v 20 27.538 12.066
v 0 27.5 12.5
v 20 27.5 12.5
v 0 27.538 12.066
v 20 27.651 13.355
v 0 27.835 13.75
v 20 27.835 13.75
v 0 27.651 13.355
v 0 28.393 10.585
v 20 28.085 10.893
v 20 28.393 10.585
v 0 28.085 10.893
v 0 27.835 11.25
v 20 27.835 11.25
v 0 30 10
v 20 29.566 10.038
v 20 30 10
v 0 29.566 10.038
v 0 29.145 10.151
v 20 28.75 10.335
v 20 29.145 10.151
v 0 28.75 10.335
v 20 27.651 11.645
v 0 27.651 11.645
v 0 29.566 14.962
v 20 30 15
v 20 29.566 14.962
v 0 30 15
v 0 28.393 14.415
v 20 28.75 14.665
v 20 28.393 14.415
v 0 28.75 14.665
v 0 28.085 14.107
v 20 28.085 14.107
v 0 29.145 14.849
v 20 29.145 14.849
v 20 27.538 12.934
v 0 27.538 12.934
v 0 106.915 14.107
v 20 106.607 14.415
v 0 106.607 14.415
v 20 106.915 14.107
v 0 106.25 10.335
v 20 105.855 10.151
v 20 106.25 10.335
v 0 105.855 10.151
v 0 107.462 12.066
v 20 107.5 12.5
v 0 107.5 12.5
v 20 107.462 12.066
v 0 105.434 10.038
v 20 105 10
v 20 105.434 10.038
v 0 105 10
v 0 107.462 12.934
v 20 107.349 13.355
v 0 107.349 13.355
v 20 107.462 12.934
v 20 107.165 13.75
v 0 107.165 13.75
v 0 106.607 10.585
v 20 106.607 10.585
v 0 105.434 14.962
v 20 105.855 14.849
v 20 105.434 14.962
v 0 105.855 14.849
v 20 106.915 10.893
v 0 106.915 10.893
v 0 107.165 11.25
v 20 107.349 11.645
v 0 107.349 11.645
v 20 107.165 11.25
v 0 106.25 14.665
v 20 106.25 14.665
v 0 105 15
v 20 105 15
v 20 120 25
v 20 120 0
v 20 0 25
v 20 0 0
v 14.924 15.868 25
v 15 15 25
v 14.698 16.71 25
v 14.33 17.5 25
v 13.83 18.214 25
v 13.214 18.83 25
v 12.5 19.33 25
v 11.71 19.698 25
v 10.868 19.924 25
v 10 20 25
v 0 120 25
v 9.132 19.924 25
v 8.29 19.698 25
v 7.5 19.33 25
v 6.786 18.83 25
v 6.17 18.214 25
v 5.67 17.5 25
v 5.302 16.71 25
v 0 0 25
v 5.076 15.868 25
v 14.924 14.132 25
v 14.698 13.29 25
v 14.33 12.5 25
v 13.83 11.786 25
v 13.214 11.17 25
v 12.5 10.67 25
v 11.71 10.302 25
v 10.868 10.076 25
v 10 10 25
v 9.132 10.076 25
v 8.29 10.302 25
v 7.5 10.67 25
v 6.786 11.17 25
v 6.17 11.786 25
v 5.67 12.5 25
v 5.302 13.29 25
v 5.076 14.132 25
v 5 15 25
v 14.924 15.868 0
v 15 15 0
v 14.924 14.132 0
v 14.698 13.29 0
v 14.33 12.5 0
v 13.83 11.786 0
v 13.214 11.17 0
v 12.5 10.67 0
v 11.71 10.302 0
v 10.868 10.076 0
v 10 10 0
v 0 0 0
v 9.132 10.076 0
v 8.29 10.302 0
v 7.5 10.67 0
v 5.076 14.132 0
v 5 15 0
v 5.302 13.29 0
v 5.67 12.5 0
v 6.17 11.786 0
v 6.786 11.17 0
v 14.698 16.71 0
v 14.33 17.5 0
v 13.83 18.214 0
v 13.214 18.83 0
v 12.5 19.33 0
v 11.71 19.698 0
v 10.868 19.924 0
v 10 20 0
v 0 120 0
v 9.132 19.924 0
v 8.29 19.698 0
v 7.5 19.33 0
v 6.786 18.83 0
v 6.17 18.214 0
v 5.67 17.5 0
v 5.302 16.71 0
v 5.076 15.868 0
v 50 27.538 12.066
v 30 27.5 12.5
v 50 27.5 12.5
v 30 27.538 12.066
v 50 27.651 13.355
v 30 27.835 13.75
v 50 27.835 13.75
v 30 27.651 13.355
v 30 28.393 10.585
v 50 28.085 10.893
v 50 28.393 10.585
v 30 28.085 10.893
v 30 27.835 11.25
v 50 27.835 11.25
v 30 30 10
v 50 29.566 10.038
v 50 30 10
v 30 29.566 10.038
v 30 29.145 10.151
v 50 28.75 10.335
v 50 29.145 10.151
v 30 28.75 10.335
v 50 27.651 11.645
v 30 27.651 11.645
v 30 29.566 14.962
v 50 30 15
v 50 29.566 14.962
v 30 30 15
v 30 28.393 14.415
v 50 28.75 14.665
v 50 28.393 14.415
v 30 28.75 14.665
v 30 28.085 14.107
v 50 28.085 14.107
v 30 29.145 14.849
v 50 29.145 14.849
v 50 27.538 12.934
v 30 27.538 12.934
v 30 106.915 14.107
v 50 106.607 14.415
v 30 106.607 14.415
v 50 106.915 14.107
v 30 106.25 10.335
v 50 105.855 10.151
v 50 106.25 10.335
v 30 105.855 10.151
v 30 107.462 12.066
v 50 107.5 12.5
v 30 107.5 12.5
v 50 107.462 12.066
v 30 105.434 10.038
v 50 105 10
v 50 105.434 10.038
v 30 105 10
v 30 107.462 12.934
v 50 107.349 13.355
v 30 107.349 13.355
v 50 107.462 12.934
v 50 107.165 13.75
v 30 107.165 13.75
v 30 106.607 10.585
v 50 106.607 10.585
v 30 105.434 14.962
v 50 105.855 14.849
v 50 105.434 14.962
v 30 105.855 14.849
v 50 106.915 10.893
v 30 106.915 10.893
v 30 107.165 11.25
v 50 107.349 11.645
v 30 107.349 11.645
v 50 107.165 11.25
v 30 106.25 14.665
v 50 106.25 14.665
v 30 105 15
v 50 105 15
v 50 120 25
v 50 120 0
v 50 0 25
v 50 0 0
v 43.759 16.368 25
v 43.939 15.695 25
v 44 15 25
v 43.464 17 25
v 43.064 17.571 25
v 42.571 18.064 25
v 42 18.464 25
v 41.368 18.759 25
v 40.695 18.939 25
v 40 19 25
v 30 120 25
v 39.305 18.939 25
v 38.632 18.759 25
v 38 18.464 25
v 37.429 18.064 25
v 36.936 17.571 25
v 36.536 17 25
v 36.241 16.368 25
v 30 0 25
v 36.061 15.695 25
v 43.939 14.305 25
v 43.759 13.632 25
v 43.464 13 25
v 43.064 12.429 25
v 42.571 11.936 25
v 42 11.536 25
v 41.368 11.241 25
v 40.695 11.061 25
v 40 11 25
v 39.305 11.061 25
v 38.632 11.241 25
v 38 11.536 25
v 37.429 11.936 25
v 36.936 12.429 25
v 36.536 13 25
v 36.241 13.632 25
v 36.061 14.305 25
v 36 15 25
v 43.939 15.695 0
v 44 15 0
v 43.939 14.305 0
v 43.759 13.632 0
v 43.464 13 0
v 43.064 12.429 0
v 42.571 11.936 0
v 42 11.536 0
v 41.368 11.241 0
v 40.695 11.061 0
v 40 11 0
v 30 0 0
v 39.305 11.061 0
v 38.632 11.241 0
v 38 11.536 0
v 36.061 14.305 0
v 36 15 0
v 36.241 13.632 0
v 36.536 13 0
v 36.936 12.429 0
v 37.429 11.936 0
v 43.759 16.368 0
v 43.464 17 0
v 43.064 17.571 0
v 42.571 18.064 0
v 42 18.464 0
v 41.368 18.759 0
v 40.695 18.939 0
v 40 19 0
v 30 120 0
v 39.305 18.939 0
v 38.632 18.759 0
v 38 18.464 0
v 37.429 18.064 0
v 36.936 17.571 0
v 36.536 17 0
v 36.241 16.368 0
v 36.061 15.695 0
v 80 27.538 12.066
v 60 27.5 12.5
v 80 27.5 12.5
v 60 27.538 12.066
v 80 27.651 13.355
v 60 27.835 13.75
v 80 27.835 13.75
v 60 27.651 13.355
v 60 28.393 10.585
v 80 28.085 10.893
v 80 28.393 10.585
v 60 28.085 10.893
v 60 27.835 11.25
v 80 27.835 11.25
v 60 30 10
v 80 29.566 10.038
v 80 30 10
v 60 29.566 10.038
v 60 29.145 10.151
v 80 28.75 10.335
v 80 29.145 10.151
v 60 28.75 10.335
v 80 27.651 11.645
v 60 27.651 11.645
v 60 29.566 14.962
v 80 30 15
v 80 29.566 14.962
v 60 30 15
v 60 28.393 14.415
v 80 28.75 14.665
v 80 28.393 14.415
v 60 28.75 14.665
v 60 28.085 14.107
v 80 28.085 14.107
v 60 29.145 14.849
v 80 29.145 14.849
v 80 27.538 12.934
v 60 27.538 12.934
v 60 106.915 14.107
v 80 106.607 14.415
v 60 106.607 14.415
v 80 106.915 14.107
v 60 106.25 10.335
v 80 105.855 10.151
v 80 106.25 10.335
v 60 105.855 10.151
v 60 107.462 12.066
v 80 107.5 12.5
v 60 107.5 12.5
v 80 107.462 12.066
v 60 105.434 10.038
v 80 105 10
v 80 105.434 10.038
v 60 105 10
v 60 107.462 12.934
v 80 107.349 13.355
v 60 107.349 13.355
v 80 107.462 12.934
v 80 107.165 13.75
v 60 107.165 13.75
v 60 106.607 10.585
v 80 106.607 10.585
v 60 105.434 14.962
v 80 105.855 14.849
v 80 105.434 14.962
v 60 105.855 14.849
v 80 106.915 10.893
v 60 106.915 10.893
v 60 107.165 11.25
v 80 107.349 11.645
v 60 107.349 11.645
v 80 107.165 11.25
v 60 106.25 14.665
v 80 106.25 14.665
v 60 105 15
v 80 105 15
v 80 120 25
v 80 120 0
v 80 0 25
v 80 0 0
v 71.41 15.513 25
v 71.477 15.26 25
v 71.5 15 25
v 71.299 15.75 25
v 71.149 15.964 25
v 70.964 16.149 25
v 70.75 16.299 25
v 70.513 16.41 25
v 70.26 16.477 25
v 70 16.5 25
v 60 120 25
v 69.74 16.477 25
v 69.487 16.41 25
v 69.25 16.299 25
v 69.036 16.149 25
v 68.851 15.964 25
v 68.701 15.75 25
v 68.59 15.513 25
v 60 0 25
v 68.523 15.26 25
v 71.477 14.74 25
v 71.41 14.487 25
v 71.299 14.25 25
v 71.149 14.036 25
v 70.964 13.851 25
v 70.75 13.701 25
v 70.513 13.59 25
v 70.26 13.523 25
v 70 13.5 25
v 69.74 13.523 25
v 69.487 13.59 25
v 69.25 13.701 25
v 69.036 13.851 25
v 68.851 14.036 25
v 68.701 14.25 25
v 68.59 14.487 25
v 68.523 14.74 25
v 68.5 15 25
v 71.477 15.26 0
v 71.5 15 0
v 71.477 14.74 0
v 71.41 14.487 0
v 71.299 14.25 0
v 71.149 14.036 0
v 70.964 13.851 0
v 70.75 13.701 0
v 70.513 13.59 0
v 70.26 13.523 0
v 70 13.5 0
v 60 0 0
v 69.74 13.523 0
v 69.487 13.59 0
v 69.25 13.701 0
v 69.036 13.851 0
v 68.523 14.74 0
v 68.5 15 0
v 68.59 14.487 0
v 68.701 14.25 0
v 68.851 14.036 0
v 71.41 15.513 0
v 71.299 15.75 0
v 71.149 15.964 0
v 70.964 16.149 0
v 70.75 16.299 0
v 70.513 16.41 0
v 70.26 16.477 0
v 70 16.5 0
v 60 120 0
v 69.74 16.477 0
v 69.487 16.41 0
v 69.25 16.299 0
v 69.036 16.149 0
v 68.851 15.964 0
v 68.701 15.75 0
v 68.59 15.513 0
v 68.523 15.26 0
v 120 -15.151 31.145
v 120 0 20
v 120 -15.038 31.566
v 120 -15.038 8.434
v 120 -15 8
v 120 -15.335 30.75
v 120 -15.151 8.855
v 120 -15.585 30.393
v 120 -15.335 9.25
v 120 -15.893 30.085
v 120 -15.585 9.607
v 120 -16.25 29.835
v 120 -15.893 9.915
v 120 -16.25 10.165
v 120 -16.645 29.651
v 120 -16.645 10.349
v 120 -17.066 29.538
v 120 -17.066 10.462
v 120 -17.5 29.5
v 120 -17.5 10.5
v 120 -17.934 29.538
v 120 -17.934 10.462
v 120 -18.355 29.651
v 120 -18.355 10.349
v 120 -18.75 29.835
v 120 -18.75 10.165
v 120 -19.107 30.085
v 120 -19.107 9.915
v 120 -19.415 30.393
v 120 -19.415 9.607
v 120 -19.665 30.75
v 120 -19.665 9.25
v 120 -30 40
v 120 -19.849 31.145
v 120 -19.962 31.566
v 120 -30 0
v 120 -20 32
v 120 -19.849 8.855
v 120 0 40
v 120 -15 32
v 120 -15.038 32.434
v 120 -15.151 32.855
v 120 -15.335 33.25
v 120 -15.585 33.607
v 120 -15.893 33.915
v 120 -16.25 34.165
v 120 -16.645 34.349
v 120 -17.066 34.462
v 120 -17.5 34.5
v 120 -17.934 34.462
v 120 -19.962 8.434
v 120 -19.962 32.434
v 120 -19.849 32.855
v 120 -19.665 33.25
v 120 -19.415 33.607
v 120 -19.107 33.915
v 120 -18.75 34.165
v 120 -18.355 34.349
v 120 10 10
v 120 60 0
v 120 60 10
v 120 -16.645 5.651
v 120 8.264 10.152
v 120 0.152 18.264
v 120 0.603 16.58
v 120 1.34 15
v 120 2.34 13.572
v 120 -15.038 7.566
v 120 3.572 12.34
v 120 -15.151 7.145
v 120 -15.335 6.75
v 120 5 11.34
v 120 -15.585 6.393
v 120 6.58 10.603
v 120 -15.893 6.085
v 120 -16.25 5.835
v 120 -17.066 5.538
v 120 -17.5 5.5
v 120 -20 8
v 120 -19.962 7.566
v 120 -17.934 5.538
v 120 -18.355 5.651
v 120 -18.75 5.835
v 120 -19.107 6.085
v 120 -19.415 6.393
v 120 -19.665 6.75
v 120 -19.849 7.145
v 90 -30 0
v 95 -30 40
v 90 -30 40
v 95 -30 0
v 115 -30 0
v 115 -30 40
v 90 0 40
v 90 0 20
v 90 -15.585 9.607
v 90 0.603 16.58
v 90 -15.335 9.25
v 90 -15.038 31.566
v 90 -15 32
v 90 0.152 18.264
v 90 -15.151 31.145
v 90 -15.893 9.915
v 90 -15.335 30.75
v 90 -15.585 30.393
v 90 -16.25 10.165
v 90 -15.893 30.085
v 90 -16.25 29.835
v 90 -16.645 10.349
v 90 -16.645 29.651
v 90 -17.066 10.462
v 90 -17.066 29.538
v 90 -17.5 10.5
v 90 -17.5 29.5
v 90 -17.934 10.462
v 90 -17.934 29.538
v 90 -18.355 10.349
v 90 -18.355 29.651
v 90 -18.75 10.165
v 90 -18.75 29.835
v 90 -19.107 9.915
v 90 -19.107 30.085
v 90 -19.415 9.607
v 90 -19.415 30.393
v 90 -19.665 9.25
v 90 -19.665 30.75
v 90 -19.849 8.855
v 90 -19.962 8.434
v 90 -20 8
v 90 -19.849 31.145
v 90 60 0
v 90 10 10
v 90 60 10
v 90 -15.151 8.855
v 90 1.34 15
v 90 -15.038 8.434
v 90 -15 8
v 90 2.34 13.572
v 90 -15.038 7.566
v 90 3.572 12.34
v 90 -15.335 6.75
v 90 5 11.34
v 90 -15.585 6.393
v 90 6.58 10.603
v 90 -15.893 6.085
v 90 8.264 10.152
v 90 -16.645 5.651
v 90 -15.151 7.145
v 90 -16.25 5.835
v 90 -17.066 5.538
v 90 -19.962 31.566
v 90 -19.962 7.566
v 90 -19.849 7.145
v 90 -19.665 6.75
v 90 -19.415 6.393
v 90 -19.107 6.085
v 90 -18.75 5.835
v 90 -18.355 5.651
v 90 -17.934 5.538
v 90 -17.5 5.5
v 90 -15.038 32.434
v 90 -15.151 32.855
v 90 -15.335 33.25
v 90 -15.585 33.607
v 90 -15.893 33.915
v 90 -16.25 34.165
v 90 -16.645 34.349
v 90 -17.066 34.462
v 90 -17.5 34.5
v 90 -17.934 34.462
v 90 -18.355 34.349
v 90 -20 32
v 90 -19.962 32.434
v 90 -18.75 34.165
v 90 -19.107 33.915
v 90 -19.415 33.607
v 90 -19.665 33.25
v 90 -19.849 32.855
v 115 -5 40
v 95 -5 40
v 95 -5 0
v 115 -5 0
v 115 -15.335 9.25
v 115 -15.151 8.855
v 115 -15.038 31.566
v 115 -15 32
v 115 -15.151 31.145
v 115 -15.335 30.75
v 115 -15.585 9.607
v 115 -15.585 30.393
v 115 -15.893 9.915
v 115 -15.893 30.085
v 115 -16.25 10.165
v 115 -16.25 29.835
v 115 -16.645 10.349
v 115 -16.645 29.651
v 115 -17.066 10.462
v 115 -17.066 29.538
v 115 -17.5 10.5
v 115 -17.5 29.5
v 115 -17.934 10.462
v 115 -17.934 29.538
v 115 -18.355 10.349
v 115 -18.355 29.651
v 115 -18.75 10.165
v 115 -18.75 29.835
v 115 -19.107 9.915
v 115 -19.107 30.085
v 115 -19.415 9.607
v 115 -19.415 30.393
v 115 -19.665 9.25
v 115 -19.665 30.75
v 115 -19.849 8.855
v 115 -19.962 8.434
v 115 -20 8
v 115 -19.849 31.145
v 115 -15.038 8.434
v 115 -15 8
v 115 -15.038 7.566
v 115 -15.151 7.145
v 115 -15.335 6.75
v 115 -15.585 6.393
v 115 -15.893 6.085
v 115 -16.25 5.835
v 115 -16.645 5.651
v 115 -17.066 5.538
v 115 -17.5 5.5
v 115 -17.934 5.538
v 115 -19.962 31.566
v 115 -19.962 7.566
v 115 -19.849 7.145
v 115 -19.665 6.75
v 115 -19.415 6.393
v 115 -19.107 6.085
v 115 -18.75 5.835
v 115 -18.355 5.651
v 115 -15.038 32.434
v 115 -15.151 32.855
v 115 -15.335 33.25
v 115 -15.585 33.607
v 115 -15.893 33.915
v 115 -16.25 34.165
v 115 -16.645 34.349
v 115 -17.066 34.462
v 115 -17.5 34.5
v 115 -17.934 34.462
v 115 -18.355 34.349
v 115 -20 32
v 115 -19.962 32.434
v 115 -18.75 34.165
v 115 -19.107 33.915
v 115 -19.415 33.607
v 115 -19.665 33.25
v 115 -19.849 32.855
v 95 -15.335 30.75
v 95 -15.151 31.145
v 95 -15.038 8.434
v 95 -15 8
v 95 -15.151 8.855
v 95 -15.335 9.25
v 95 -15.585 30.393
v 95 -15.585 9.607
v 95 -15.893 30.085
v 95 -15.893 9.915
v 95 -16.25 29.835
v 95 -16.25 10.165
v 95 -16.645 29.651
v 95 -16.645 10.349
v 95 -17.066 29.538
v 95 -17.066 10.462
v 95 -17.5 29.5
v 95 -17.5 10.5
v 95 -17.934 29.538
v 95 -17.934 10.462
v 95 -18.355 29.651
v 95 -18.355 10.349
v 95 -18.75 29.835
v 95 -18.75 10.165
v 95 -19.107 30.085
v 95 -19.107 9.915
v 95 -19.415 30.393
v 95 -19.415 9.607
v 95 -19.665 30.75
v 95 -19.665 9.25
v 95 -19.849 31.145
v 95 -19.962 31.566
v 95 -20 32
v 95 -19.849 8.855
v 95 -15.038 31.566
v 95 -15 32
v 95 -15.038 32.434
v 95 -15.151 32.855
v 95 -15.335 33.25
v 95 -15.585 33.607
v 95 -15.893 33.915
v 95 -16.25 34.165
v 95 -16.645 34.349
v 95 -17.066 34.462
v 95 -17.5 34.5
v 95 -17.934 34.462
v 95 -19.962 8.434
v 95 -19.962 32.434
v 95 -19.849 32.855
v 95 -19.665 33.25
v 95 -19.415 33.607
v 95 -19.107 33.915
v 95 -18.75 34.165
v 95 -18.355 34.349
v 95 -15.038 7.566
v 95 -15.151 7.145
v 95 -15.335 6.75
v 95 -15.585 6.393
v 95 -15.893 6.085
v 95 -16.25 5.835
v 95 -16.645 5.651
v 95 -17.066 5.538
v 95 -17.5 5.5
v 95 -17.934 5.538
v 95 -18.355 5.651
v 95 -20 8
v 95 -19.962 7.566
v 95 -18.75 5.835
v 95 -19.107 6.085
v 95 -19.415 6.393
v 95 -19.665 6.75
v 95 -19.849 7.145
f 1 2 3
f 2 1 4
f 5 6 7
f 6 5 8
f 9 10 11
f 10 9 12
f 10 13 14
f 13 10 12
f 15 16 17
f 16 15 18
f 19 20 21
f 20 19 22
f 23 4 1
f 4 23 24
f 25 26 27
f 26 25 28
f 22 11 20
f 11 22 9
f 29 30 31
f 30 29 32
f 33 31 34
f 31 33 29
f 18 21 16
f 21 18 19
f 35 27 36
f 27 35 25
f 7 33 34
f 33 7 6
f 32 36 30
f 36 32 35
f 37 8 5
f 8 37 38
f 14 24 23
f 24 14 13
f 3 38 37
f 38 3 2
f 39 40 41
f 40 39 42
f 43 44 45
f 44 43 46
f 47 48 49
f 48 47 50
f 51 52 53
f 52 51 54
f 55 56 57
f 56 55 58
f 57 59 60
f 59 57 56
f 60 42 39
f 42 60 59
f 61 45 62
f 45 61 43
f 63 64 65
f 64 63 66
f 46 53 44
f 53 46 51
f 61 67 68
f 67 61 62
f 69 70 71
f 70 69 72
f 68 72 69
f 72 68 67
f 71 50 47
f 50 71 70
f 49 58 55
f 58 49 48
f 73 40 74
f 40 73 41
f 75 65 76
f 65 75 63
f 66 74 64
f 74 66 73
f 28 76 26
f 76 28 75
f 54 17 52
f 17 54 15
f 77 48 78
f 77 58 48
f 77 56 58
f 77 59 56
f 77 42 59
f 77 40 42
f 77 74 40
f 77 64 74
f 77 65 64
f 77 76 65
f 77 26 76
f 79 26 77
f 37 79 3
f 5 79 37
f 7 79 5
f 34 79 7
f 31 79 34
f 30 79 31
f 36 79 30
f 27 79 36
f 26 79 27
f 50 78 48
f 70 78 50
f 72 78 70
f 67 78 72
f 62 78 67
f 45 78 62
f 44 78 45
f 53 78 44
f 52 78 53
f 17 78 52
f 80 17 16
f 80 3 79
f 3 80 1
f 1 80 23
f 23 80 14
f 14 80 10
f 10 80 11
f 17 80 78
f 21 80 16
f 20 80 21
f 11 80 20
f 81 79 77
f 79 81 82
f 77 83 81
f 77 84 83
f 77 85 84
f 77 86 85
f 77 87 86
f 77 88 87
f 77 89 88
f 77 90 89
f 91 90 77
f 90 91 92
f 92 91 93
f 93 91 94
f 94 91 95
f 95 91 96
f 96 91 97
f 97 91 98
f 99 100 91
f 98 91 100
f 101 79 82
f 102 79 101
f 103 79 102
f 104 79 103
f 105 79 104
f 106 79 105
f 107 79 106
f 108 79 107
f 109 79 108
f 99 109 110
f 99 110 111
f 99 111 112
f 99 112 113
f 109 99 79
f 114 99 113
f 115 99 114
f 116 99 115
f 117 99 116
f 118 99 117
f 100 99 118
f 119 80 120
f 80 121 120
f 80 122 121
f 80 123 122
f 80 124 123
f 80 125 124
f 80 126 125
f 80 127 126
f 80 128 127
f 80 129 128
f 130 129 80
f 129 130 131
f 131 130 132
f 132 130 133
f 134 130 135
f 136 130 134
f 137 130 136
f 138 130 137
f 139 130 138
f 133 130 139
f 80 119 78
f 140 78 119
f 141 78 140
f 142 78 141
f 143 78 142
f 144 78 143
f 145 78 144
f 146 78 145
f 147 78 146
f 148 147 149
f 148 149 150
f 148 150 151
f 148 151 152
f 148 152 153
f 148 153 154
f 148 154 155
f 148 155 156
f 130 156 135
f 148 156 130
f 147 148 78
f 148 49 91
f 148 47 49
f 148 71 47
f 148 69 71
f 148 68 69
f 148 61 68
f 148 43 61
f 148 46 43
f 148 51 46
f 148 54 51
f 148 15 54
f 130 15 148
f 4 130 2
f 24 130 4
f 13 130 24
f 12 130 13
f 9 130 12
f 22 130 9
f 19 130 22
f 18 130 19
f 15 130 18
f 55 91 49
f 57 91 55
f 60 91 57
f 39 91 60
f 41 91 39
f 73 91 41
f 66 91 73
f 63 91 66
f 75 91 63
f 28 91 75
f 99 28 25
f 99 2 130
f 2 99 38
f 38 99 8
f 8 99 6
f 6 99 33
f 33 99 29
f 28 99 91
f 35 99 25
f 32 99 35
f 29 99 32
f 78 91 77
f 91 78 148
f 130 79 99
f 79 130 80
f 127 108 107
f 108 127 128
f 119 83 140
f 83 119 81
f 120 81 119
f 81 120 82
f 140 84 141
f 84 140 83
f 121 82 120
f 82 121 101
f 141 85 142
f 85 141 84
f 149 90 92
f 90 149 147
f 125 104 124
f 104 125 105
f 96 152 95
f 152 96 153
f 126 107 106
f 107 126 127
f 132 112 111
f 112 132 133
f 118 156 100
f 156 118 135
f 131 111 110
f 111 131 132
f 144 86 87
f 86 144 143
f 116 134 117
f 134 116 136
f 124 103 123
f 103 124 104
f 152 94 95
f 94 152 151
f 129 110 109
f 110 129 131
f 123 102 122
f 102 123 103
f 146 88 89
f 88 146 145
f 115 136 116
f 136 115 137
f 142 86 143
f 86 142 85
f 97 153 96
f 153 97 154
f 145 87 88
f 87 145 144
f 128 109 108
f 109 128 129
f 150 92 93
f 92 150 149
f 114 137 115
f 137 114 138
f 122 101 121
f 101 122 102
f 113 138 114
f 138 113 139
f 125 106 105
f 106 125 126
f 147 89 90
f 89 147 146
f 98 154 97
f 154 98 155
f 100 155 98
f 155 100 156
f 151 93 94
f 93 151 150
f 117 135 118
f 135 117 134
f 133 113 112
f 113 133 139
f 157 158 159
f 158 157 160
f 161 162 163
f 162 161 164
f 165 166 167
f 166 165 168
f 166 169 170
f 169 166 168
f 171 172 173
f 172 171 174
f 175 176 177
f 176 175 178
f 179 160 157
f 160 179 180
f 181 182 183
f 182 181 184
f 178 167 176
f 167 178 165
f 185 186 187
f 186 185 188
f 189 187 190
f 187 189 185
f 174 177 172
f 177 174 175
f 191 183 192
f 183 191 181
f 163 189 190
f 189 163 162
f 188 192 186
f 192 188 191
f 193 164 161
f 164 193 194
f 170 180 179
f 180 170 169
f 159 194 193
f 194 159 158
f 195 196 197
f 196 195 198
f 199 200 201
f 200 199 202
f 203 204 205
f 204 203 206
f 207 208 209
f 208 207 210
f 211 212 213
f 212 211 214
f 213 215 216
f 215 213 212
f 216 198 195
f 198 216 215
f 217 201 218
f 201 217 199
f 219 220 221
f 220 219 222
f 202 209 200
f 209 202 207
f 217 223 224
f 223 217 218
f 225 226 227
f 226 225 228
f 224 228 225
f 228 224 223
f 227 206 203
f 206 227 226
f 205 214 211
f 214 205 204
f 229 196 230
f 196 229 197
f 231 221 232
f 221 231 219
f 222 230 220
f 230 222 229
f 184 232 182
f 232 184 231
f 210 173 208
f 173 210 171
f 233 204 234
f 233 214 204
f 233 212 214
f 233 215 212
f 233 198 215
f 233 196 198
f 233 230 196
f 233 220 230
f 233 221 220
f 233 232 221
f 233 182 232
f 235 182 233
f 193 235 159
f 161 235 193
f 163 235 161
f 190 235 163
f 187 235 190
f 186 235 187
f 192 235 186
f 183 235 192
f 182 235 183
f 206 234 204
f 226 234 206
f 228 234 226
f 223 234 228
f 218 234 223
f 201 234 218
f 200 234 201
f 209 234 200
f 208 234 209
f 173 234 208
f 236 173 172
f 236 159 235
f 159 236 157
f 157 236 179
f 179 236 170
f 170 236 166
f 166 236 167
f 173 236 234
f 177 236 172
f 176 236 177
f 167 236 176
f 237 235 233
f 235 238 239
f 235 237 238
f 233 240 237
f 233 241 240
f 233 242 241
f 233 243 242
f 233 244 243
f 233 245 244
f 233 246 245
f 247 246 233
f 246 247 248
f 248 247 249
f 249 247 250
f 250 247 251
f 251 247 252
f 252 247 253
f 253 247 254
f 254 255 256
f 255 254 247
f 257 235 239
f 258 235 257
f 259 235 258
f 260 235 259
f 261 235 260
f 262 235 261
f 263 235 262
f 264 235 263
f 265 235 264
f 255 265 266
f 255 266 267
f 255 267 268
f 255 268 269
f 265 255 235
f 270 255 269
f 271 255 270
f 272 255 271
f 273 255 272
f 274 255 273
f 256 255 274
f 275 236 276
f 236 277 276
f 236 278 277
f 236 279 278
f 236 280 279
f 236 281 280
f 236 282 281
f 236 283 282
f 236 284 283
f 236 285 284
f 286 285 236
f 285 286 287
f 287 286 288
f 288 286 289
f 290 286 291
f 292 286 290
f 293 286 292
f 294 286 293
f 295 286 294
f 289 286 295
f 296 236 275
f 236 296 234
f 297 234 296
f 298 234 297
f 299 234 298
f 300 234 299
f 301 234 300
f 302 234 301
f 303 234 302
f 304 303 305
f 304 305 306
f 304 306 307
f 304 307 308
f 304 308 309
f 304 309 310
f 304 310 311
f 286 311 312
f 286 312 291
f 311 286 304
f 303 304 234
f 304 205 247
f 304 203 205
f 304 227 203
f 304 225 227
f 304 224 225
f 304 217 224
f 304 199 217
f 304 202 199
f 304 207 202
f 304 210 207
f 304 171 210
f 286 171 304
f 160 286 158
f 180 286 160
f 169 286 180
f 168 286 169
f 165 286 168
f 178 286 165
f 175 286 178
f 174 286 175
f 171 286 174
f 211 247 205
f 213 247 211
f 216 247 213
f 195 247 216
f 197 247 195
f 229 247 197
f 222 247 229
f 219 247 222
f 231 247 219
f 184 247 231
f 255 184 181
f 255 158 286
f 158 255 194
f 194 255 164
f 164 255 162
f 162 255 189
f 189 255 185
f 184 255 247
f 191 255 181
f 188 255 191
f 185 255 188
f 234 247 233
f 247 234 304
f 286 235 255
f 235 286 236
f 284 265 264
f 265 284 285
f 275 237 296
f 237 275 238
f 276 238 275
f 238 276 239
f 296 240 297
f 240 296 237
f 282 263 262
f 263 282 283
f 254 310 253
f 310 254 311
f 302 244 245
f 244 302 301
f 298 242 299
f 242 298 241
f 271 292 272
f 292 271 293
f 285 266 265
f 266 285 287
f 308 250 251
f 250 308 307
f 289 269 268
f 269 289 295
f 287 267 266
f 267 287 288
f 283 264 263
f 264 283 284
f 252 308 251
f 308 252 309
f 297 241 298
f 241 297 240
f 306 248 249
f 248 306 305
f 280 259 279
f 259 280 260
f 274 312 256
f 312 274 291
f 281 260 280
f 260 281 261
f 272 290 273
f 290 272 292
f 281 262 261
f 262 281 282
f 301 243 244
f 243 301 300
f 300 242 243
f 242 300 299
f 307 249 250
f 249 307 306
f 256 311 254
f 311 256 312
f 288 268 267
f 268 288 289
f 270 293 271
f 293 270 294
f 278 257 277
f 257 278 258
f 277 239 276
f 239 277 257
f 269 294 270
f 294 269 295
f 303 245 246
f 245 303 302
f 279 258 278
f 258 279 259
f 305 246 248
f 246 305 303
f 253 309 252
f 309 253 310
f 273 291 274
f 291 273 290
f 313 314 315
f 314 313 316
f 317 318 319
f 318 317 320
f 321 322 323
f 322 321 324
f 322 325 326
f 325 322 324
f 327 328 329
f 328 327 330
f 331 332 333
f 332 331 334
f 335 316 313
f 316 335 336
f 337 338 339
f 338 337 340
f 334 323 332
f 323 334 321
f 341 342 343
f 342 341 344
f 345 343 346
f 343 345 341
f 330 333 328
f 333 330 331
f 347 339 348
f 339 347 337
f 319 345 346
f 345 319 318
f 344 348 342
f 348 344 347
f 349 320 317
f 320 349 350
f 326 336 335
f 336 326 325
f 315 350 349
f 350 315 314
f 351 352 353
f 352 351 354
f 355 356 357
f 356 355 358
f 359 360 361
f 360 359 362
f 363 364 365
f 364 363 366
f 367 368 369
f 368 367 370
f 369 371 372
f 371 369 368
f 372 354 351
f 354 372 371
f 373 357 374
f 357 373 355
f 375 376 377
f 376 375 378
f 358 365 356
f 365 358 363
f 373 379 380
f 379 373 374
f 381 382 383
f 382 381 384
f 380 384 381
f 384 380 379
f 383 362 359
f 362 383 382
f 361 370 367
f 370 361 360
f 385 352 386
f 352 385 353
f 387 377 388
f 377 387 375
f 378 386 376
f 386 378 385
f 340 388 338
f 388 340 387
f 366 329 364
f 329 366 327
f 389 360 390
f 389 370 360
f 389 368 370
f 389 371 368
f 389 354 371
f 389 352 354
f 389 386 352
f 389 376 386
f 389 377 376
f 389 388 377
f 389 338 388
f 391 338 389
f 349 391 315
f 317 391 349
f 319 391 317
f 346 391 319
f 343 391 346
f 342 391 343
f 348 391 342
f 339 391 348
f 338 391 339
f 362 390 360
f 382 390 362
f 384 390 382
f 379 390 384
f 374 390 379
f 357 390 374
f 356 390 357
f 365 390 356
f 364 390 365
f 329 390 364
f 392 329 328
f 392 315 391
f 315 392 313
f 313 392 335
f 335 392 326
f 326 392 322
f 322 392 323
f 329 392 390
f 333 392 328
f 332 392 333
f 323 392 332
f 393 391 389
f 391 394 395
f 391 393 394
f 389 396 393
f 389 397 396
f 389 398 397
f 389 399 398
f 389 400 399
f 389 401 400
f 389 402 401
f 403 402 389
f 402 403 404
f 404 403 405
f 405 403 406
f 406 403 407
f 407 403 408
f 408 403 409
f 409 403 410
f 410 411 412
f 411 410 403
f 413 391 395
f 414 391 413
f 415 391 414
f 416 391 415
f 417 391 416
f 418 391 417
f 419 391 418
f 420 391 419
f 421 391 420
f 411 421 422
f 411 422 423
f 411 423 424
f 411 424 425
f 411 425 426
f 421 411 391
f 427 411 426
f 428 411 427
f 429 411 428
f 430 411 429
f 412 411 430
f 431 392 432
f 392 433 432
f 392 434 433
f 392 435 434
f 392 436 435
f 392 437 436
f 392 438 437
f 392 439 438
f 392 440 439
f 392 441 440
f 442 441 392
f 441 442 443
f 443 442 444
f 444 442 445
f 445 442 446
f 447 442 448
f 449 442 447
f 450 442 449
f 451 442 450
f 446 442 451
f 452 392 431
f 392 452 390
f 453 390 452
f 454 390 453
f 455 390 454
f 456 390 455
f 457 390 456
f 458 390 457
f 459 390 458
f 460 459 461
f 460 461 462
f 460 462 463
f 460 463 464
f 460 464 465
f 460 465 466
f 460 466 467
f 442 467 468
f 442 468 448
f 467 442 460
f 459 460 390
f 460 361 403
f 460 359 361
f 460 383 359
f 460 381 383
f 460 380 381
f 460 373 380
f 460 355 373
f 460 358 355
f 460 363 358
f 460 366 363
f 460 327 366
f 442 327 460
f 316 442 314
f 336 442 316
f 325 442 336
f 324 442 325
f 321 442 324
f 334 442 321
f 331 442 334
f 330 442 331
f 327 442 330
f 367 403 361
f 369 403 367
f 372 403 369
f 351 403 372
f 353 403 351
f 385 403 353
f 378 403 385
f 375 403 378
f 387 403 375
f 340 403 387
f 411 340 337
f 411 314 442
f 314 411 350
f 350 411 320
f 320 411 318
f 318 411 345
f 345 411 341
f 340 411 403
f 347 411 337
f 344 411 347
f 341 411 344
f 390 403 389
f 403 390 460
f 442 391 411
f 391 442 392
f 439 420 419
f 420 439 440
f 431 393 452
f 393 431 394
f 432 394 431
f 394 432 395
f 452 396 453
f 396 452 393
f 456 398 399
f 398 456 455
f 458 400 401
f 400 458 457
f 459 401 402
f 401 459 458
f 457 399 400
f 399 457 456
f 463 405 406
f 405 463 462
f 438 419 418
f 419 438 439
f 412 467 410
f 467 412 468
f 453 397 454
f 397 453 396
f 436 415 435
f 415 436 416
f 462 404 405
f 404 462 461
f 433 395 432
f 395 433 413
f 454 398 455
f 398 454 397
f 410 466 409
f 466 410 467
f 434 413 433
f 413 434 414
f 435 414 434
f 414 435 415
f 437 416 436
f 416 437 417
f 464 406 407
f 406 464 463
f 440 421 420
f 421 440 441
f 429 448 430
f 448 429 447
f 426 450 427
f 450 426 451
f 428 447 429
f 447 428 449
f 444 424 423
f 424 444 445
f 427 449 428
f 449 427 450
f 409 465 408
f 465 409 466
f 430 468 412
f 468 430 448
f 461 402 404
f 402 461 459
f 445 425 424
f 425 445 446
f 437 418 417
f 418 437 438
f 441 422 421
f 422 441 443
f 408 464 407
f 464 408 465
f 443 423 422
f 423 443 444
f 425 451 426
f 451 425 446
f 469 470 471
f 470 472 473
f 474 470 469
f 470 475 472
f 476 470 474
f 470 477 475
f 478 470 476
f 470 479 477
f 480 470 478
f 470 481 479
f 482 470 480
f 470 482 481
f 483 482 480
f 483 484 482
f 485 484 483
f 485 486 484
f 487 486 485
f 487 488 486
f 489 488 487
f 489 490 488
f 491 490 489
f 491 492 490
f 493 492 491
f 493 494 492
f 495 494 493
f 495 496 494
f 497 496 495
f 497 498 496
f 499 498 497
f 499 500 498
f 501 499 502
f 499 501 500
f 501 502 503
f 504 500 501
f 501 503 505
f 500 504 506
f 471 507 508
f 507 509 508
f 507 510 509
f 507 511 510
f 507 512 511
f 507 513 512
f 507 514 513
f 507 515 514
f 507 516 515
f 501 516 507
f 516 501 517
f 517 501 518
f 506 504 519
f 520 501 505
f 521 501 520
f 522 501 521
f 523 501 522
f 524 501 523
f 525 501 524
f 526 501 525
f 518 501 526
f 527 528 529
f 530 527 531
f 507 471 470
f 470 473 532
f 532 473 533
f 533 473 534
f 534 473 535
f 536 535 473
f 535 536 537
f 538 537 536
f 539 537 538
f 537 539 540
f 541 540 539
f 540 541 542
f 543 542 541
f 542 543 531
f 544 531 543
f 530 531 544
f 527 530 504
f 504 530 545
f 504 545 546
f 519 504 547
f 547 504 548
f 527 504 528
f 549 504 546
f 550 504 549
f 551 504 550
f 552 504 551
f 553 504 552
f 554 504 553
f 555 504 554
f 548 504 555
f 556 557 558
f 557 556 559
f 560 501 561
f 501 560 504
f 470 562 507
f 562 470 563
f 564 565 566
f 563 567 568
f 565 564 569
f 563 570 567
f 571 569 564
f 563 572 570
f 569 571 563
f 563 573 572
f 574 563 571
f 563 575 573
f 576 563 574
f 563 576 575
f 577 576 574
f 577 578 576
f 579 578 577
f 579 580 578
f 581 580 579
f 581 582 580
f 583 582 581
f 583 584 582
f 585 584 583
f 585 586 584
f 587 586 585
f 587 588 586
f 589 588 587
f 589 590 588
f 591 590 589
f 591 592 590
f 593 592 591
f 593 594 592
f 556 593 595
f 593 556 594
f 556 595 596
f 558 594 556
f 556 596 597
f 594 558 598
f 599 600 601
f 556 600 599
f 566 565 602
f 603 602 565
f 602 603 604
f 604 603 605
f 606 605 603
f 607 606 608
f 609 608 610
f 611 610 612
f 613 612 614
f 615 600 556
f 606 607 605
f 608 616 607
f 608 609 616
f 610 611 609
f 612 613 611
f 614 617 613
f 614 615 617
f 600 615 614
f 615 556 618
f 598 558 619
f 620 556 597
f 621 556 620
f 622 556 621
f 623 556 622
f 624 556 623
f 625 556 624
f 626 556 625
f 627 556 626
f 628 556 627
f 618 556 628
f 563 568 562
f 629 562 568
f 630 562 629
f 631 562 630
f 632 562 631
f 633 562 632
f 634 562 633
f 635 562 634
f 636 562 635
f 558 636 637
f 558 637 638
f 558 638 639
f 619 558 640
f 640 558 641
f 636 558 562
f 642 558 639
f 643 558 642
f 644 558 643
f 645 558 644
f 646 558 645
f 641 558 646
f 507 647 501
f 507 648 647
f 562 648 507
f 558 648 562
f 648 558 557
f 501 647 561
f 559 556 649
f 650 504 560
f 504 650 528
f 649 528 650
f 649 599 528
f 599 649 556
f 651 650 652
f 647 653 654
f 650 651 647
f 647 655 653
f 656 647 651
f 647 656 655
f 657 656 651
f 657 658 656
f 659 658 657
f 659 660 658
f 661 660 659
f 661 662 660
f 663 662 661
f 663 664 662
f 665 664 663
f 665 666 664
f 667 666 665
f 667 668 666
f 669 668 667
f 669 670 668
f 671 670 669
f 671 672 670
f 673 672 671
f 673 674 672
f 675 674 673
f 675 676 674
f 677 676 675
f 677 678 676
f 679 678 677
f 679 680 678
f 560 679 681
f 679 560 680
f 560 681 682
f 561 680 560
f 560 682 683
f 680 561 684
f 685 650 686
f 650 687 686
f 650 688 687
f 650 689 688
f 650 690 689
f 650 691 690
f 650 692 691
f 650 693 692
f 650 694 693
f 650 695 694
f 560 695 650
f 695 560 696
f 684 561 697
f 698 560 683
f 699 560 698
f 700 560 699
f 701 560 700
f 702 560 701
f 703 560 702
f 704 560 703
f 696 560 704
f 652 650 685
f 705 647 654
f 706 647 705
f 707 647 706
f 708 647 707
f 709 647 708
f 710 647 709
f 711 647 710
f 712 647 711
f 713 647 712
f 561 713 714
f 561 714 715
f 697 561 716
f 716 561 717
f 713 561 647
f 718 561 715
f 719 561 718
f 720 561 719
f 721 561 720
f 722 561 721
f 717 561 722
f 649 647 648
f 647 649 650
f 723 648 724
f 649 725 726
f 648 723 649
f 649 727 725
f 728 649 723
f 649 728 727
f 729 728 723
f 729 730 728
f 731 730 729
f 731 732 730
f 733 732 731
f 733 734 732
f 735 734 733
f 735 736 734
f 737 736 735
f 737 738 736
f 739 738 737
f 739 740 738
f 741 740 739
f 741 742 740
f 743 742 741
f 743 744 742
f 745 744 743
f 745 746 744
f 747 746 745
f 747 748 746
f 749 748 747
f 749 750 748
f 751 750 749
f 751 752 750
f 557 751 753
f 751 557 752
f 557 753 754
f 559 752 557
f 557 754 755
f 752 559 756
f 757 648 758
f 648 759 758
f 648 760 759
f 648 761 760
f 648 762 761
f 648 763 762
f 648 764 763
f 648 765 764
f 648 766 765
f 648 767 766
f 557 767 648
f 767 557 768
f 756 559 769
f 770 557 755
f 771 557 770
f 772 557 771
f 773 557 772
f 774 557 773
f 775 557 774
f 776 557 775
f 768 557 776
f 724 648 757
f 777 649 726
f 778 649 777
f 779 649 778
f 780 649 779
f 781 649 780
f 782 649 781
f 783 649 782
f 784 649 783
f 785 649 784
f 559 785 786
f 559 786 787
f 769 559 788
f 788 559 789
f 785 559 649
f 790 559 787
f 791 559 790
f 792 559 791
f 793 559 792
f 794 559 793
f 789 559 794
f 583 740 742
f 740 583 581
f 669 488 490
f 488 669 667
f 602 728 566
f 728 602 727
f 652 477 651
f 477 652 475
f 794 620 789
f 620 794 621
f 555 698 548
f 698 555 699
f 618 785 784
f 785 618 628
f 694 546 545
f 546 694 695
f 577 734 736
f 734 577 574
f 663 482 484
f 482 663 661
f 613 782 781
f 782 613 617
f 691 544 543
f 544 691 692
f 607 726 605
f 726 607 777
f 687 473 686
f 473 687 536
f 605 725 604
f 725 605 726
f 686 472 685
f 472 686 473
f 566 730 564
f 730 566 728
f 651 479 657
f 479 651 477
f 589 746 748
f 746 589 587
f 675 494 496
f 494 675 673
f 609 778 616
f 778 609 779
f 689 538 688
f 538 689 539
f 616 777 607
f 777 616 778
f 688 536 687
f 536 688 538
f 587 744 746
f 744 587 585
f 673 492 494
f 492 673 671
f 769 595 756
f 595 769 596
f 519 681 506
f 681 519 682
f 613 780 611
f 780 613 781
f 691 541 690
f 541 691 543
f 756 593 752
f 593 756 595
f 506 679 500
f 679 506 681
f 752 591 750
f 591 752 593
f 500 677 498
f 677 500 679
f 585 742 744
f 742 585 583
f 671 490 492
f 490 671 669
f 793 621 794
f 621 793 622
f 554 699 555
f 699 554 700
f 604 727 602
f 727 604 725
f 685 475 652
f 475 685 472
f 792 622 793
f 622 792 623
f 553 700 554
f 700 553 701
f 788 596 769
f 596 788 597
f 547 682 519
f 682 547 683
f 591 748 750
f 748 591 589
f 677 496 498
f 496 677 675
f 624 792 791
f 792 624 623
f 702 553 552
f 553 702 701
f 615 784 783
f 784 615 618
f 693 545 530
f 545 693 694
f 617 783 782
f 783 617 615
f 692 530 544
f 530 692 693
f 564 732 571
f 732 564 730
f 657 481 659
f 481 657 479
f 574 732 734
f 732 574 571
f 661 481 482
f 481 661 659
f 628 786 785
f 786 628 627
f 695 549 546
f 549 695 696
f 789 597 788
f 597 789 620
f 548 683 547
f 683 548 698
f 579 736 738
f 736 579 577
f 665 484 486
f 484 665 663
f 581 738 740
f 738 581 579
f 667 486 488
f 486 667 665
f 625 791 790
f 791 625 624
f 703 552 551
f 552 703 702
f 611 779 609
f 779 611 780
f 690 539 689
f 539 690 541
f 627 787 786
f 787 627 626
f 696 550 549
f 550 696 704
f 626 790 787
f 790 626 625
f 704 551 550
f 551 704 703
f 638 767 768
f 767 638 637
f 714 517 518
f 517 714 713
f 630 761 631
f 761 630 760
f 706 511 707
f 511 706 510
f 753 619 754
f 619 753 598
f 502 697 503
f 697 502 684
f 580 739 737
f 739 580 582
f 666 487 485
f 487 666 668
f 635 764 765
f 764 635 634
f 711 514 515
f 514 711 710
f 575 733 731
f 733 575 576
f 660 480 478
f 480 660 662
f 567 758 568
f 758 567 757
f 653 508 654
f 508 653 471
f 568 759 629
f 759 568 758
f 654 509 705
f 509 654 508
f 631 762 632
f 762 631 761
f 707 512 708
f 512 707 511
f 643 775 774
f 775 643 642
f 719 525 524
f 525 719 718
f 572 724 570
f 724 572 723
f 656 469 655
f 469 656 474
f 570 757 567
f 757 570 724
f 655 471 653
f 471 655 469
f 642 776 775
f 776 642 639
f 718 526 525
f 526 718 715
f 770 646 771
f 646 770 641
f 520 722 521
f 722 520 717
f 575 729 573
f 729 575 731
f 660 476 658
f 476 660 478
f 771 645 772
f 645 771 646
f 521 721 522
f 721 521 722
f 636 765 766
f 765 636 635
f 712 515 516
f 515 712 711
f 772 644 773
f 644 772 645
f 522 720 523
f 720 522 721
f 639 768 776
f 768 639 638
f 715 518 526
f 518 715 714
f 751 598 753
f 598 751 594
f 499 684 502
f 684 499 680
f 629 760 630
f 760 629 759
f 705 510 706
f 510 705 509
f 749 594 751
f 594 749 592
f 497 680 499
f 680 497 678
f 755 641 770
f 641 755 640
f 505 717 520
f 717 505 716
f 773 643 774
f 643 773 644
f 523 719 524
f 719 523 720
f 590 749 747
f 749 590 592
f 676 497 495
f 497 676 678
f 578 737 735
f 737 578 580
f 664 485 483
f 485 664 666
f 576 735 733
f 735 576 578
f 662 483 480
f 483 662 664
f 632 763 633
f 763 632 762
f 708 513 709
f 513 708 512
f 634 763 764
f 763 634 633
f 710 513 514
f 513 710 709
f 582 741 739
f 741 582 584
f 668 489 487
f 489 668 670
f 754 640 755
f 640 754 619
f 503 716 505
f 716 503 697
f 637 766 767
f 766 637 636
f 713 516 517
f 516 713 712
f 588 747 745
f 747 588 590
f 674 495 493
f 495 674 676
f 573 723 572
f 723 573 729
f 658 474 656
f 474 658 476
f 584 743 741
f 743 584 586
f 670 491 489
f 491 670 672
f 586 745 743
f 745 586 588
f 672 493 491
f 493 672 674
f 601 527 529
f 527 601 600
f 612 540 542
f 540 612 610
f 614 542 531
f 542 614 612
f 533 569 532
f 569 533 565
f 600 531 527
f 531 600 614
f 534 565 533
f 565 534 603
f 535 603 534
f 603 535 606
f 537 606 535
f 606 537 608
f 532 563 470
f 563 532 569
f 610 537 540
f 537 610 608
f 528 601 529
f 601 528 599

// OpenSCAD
//----------------------------------------------------------------------------

$fn = 36;

epsilon = 0.1;

beam_length = 120;
beam_width = 20;
beam_height = 25; // drill bit is lead this much

beard_length = 90;

//----------------------------------------------------------------------------

translate([0 * beam_width * 1.5, 0, 0])
beam(10);

translate([1 * beam_width * 1.5, 0, 0])
beam(8);

translate([2 * beam_width * 1.5, 0, 0])
beam(3);

translate([3 * beam_width * 1.5, 0, 0])
rotate([90, 0, 0])
beard(beard_length);

//----------------------------------------------------------------------------

module beard(beard_length) {
  beard_width = beam_width * 1.5;
  beard_depth = beam_length / 3;

  roundover = beam_width / 2;
  thickness = (beard_width - beam_width) / 2;

  beam_holder_height = beam_height + thickness;

  difference() {
    cube([beard_width, beard_depth, beam_holder_height]);

    translate([(beard_width - beam_width) / 2, -epsilon, beam_holder_height - beam_height])
    cube([beam_width, beard_depth + 2 * epsilon, beam_height + epsilon]);

    // M5 thread
    translate([0, beard_depth / 5, beam_holder_height - beam_height / 2])
    beard_screw_hole(d = 5, cut_depth = beard_width);

    translate([0, beard_depth / 5 * 4, beam_holder_height - beam_height / 2])
    beard_screw_hole(d = 5, cut_depth = beard_width);
  }

  translate([0, 0, -(beard_length - beam_holder_height)])
  cube([beard_width, thickness * 2, beard_length - beam_holder_height]);

  translate([0, thickness * 2, 0])
  rotate([0, 90, 0])
  difference() {
    cube([roundover, roundover, beard_width]);
    translate([roundover, roundover, -epsilon])
    cylinder(r = roundover, h = beard_width + 2 * epsilon);
  }
}

module beam(d) {
  difference() {
    cube([beam_width, beam_length, beam_height]);

    translate([beam_width / 2, beam_length / 8, 0])
    drill_lead(d = d, l = beam_height);

    // M5 thread
    translate([0, beam_length / 8 * 2, beam_height / 2])
    beam_screw_hole(d = 5, l = beam_length / 8 * 5, cut_depth = beam_width);
  }
}

//----------------------------------------------------------------------------

module beam_screw_hole(d, l, cut_depth) {
  translate([-epsilon, 0, 0])
  rotate([0, 90, 0])
  cylinder(d = d, h = cut_depth + 2 * epsilon);

  translate([-epsilon, l, 0])
  rotate([0, 90, 0])
  cylinder(d = d, h = cut_depth + 2 * epsilon);

  translate([-epsilon, 0, -d / 2])
  cube([cut_depth + 2 * epsilon, l, d]);
}

module beard_screw_hole(d, cut_depth) {
  translate([-epsilon, 0, 0])
  rotate([0, 90, 0])
  cylinder(d = d, h = cut_depth + 2 * epsilon);
}

module drill_lead(d, l) {
  translate([0, 0, -epsilon])
  cylinder(d = d, h = l + 2 * epsilon);
}

//----------------------------------------------------------------------------

nut_sizes = [
  ["m4",  7, 3  ],
  ["m5",  8, 4  ],
  ["m6", 10, 5  ],
  ["m8", 13, 6.5],
  ["m10",17, 8  ],
];

// distance between flats (wrench size)
function nut_width(size)  = nut_sizes[search([size], nut_sizes)[0]][1];
function nut_height(size) = nut_sizes[search([size], nut_sizes)[0]][2];

module nut_head(width, height) {
  side = width / sqrt(3);

  for (i = [0, 60, 120]) {
    rotate([0, 0, i])
    translate([-side / 2, -width / 2, 0])
    cube([side, width, height]);
  }
}

//----------------------------------------------------------------------------
// vim:ft=openscad
